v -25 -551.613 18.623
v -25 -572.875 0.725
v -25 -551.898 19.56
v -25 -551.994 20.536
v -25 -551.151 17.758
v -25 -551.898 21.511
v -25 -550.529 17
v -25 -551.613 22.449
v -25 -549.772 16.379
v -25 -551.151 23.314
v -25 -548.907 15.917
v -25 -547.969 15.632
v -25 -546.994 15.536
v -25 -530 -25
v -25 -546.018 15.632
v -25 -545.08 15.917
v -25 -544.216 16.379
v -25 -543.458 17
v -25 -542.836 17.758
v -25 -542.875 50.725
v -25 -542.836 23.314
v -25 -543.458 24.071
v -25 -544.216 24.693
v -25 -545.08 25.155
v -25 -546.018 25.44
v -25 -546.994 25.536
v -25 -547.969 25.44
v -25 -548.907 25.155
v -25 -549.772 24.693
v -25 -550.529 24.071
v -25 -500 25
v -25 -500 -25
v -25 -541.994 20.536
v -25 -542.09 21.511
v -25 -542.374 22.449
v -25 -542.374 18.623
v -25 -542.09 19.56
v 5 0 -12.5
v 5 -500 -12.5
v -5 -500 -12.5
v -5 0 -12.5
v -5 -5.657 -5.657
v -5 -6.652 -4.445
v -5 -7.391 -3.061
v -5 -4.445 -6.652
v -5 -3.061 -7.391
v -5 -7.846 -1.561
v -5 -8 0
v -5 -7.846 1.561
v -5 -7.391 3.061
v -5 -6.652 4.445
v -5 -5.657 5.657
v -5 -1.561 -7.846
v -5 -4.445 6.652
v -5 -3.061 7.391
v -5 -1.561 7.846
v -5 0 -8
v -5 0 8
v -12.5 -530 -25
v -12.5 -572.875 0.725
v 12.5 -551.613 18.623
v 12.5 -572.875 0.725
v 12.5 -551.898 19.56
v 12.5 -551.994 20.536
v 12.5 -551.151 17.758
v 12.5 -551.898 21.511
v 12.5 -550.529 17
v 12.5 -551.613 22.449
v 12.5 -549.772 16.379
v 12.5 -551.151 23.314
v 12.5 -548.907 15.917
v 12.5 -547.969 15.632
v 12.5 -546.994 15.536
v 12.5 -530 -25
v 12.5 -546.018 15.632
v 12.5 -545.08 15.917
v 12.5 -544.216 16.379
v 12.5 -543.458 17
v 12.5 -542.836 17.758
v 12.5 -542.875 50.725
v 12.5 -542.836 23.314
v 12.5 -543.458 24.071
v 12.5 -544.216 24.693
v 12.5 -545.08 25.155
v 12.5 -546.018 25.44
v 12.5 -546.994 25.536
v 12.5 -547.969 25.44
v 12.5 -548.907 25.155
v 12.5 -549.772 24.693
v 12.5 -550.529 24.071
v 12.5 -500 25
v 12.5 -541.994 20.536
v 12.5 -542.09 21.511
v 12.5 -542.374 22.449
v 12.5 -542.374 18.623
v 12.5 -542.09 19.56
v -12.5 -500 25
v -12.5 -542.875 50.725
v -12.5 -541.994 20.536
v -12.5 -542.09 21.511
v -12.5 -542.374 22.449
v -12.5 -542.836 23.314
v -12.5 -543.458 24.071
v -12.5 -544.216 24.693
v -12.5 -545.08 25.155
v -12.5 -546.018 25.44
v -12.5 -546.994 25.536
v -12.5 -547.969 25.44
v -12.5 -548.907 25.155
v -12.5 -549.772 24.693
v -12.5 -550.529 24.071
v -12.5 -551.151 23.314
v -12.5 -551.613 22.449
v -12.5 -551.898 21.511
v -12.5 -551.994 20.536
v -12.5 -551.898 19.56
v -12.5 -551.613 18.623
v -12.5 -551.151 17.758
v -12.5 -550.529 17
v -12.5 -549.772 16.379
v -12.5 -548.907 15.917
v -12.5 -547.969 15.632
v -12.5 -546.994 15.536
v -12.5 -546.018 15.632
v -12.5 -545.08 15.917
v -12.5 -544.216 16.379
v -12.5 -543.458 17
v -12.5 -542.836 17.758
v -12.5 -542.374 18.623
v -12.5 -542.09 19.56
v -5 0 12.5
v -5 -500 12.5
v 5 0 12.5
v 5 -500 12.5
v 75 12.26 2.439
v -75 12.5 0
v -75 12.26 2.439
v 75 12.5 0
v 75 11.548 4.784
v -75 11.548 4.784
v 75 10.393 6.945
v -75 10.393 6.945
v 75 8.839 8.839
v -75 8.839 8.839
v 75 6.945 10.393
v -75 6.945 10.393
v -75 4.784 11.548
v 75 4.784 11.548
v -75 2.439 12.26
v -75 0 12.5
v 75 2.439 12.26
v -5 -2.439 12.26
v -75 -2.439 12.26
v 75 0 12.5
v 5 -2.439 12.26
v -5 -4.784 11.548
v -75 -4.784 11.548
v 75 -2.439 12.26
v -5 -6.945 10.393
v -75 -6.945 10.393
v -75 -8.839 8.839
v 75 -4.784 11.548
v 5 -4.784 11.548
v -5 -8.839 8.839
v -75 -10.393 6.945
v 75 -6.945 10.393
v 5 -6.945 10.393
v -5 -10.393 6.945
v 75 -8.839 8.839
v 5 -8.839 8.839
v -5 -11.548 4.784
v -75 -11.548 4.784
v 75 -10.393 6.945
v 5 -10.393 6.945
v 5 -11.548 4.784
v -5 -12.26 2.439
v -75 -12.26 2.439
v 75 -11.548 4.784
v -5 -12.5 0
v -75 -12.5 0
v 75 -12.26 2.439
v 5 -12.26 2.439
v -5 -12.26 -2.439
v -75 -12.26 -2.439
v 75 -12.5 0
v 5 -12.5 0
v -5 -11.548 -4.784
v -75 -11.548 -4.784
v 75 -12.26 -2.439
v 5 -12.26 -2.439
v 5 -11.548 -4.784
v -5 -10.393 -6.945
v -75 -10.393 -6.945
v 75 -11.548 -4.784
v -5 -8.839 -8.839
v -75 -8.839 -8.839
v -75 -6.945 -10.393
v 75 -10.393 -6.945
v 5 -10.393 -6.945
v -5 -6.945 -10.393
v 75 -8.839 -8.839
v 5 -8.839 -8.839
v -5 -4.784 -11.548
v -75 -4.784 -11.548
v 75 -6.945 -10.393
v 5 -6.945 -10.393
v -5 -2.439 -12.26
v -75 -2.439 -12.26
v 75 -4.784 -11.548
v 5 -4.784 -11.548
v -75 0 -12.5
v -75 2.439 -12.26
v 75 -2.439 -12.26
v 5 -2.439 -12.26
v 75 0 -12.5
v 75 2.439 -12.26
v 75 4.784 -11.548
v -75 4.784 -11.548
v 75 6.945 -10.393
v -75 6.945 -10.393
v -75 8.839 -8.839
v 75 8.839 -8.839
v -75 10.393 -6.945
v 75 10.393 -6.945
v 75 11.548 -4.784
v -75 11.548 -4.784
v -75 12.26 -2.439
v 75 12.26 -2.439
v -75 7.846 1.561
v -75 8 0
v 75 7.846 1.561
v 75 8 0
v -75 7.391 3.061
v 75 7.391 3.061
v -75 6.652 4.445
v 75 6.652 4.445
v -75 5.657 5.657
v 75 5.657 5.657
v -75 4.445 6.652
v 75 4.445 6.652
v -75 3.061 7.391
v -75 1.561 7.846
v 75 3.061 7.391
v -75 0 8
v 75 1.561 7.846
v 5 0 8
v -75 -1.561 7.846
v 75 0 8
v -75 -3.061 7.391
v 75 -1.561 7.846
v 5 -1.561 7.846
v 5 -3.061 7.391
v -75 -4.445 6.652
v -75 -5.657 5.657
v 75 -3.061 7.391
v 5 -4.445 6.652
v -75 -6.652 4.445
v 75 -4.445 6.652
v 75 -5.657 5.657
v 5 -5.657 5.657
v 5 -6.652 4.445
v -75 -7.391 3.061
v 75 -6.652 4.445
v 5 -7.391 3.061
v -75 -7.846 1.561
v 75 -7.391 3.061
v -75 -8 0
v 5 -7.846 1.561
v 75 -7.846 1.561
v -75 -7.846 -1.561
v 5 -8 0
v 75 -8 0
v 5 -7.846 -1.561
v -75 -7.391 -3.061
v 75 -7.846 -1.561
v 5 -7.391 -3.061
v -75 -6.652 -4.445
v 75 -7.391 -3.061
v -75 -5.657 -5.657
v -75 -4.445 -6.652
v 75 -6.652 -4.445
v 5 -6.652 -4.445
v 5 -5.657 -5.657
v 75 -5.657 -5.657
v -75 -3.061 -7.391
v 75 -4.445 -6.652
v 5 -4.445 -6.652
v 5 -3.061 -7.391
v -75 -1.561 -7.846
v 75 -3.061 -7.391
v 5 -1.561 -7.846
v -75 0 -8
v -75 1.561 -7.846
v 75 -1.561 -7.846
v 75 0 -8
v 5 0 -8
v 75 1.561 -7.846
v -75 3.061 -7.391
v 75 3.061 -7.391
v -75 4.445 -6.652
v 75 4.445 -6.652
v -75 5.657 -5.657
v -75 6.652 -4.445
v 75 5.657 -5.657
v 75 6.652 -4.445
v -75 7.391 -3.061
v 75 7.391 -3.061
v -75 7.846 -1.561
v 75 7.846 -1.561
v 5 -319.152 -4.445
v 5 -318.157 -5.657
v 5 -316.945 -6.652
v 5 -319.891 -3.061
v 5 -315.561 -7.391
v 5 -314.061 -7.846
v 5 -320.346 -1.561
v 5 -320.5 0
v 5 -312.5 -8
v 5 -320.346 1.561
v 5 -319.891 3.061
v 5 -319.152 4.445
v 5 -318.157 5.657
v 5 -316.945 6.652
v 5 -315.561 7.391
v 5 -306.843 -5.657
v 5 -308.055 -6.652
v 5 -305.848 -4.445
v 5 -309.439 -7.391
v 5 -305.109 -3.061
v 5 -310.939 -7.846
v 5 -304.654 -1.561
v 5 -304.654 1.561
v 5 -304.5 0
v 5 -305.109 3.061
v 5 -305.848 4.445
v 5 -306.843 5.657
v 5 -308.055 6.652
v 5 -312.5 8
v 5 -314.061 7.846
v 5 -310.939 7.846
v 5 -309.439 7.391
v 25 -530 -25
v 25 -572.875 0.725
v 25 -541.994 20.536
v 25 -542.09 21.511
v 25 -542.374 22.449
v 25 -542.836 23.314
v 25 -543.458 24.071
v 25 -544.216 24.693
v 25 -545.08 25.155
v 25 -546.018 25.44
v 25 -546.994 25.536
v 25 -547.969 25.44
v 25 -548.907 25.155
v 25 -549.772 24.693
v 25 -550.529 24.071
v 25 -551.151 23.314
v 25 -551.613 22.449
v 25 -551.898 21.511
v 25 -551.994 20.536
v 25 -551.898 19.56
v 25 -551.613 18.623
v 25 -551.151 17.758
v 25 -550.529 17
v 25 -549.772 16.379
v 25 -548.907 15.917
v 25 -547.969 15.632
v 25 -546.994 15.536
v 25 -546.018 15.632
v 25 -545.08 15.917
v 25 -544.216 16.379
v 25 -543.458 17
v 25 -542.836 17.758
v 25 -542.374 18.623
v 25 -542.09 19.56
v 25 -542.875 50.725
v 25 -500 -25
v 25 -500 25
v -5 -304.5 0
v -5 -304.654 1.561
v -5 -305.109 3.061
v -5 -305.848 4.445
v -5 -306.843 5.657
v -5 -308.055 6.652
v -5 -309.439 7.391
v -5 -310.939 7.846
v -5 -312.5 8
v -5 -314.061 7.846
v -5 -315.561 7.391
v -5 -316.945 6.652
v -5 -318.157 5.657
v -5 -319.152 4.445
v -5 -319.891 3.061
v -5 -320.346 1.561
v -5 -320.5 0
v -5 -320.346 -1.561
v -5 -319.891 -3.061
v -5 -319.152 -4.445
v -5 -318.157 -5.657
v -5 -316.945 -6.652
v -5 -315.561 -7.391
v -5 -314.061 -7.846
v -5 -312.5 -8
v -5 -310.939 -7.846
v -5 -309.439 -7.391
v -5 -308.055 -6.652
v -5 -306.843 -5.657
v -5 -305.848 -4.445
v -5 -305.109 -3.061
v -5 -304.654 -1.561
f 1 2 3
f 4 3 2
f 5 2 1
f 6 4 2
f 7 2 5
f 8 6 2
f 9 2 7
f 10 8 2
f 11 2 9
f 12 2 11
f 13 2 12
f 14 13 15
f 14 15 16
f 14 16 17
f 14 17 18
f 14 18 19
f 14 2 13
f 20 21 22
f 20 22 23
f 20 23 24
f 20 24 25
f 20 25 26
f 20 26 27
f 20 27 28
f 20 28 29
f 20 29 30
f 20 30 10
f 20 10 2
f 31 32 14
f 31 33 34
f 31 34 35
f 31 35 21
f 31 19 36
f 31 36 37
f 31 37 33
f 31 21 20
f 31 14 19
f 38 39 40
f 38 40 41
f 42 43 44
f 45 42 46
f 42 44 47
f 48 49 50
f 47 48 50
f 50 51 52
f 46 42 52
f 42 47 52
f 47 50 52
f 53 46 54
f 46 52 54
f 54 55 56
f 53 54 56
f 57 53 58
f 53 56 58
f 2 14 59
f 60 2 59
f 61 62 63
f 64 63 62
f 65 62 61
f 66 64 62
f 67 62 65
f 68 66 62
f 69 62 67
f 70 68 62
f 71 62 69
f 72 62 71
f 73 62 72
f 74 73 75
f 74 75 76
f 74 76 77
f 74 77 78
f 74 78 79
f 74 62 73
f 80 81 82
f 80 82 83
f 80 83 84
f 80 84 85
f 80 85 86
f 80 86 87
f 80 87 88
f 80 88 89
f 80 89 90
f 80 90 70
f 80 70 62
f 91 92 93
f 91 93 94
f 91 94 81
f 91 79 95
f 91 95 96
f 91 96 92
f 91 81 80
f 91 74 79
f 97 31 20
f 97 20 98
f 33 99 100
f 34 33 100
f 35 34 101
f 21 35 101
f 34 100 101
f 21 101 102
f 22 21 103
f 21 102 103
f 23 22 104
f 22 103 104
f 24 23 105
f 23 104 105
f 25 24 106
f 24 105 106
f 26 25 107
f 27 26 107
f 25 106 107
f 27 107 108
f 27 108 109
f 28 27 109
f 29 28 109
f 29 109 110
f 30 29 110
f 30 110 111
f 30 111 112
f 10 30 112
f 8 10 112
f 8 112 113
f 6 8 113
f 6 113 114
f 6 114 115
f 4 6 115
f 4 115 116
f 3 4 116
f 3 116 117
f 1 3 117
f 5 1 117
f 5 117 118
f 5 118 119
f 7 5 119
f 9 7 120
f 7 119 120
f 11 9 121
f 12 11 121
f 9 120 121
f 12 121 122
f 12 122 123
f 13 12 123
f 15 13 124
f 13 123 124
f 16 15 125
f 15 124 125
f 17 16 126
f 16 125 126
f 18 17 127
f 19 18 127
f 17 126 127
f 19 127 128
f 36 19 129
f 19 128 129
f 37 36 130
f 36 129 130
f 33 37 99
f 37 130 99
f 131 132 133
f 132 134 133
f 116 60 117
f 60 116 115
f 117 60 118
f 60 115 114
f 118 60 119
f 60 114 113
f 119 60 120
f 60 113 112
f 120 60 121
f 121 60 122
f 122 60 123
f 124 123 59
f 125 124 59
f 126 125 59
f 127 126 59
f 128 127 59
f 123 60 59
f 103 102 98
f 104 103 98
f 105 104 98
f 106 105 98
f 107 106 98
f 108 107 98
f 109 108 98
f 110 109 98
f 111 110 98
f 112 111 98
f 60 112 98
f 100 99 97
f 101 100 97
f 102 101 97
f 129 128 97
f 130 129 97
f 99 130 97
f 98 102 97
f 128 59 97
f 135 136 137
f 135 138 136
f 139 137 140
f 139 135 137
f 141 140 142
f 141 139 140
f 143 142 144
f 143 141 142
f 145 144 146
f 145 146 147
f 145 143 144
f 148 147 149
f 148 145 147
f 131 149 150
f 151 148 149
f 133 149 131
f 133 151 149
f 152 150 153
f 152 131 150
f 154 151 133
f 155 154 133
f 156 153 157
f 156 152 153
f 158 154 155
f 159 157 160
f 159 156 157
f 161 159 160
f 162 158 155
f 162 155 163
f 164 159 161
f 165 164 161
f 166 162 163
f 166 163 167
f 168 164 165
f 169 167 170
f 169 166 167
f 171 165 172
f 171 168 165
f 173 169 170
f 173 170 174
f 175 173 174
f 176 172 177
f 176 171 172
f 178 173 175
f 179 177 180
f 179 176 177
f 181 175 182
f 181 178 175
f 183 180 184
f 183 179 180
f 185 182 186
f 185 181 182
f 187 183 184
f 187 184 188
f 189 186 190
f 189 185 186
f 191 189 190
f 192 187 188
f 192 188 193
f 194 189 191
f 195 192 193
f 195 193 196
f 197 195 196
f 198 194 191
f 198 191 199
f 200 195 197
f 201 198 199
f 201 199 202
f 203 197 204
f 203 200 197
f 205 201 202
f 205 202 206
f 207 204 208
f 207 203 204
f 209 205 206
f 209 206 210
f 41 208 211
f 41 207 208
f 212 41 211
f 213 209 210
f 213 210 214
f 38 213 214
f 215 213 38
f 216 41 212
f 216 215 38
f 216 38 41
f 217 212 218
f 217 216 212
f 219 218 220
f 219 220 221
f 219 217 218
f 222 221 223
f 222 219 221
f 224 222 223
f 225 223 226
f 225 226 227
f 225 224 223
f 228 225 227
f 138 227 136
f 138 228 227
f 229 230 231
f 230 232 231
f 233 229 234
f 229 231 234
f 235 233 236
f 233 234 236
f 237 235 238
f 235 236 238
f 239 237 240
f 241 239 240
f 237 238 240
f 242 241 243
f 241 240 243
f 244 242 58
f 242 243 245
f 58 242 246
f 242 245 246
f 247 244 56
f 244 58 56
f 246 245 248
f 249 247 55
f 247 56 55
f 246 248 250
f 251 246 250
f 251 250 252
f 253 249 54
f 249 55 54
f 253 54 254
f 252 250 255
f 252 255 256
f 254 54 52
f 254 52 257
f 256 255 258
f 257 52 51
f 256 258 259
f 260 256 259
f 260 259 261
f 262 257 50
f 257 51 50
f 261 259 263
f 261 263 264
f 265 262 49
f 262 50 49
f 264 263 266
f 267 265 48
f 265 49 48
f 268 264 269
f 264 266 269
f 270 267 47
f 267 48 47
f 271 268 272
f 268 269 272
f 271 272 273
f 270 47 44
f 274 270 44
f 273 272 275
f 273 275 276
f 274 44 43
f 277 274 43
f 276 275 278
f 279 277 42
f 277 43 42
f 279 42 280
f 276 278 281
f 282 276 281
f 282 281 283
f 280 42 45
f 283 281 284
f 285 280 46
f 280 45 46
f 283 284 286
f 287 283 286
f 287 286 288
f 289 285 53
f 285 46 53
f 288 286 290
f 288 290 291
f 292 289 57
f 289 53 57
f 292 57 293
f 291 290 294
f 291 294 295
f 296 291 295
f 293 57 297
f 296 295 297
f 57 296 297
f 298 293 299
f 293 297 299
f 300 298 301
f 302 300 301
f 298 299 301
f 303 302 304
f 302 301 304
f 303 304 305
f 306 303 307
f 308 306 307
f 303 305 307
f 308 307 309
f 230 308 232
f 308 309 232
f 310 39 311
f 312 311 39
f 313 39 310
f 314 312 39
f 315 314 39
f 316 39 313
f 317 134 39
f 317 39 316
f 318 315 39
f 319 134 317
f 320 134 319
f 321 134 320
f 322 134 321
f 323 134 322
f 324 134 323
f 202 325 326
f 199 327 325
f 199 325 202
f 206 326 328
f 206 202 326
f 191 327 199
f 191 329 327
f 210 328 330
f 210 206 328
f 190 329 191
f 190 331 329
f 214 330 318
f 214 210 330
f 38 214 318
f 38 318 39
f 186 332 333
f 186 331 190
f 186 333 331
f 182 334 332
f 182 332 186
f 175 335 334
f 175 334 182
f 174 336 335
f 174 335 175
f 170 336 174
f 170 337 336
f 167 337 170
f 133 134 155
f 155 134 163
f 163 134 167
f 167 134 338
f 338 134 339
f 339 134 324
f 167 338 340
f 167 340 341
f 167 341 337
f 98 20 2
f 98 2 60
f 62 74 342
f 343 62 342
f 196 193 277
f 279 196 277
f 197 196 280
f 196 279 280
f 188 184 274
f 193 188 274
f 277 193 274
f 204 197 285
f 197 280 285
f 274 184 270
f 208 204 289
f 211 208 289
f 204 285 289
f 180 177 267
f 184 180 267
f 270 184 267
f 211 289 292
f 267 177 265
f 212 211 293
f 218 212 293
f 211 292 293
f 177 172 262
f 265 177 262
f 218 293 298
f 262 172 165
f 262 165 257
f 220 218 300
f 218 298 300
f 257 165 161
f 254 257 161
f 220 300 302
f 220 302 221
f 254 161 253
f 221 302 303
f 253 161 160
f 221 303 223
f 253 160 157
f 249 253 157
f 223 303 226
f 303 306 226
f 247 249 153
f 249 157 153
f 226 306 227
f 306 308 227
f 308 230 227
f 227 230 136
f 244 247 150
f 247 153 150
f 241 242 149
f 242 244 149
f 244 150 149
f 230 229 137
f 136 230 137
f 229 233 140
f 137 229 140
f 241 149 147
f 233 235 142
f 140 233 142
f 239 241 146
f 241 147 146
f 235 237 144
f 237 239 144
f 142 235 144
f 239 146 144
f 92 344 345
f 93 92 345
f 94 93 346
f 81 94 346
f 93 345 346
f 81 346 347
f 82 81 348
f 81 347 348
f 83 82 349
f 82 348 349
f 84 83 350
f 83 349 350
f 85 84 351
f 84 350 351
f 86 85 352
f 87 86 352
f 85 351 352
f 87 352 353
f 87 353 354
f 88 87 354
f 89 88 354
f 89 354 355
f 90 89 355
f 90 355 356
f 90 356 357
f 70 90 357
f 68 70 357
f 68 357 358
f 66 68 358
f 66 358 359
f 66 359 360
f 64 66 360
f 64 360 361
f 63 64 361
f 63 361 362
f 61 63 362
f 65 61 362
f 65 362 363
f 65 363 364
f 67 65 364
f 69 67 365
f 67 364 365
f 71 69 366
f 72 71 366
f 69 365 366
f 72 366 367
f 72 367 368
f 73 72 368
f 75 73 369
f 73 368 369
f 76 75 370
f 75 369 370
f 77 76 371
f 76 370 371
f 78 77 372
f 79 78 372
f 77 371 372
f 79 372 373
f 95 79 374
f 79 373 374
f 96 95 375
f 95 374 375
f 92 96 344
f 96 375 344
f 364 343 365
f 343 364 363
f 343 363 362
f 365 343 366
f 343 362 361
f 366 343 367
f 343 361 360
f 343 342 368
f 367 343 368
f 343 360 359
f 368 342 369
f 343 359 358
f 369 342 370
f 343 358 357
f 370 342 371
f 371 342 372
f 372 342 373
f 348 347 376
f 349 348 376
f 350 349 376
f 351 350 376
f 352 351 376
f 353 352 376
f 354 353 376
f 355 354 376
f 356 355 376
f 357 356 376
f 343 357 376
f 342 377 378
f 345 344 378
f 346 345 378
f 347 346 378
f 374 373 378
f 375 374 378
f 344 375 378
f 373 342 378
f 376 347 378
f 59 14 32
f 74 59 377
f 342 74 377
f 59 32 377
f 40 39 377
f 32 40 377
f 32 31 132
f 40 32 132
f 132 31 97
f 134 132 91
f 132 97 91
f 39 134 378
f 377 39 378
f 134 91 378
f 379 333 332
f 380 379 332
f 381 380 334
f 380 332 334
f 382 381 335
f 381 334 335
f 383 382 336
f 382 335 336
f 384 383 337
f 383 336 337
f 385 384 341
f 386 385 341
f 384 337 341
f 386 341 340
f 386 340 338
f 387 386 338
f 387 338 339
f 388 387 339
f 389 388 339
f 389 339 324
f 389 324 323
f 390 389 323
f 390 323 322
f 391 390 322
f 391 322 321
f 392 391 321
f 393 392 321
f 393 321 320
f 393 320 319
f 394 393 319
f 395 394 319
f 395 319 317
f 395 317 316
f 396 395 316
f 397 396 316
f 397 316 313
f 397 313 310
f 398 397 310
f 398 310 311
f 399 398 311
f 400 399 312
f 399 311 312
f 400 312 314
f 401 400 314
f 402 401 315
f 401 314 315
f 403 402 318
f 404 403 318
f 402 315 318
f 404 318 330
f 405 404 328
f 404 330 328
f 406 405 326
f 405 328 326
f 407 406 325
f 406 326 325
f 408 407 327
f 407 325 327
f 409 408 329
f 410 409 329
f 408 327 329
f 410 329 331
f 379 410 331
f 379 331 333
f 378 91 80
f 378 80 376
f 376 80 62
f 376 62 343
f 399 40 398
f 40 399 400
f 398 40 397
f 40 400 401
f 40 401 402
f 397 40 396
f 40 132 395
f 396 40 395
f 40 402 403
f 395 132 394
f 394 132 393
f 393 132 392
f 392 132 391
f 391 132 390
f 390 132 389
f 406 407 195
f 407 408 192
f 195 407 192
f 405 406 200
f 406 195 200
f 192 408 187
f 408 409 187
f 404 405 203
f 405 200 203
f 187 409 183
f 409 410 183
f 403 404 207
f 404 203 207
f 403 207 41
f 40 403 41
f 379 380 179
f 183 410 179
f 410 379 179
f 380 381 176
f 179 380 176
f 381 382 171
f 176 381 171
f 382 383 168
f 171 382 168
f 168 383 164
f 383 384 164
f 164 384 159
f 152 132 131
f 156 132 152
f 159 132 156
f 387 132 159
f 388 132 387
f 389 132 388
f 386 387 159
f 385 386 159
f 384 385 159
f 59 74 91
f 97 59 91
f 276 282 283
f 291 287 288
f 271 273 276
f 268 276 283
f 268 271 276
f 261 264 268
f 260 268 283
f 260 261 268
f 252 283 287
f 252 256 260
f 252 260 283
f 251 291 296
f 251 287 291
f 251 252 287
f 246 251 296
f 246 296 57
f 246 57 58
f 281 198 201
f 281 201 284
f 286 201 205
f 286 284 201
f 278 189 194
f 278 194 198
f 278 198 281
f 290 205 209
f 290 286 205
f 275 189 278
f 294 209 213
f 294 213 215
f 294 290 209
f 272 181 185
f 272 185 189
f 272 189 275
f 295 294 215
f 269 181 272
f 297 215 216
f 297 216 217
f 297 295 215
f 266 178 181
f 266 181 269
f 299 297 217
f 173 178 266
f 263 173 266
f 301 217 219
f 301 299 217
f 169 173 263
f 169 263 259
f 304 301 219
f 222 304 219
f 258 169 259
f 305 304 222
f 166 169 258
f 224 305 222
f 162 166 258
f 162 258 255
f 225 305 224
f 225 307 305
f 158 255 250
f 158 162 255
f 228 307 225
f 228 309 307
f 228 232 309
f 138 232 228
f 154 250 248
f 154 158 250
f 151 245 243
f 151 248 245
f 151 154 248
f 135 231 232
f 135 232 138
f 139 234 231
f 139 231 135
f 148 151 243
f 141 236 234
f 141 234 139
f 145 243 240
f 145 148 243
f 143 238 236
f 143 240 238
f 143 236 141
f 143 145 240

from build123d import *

# Parameters (mm, degrees)
F0_R          = 12.5
F0_R_2        = 8
F1_DEPTH      = 75
F1_DEPTH_BACK = 75
F2_W          = 500
F2_H          = 25
F3_DEPTH      = 5
F3_DEPTH_BACK = 5
F4_R          = 8
F5_DEPTH      = 25
F5_DEPTH_BACK = 25
F6_W          = 50
F6_H          = 50
F6_W_2        = 10
F6_H_2        = 25
F7_DEPTH      = 30
F9_DEPTH      = 50
F10_W         = 12.5
F10_H         = 58.3095189485
F11_DEPTH     = 50
F12_R         = 5
F13_DEPTH     = 100.001


with BuildPart() as f1:
    # F0 (on Right) → F1 (new body, two sides)
    with BuildSketch(Plane.YZ) as f1_sk:
        Circle(F0_R)
        Circle(F0_R_2, mode=Mode.SUBTRACT)
    extrude(amount=F1_DEPTH)
    extrude(f1_sk.sketch, amount=-F1_DEPTH_BACK)

    # F2 (on Right) → F3 (join, two sides)
    with BuildSketch(Plane.YZ) as f3_sk:
        with Locations((-250, 0)):
            Rectangle(F2_W, F2_H)
    extrude(amount=F3_DEPTH)
    extrude(f3_sk.sketch, amount=-F3_DEPTH_BACK)

    # F4 (on face) → F5 (cut, two sides)
    with BuildSketch(Plane.YZ.offset(5)) as f5_sk:
        with Locations((-312.5, 0)):
            Circle(F4_R)
    extrude(amount=F5_DEPTH, mode=Mode.SUBTRACT)
    extrude(f5_sk.sketch, amount=-F5_DEPTH_BACK, mode=Mode.SUBTRACT)

    # F6 (on face) → F7 (join)
    with BuildSketch(Plane.XZ.offset(500)):
        Rectangle(F6_W, F6_H)
        Rectangle(F6_W_2, F6_H_2, mode=Mode.SUBTRACT)
        Rectangle(F6_W_2, F6_H_2)
    extrude(amount=F7_DEPTH)

    # F8 (on face) → F9 (cut)
    with BuildSketch(Plane.YZ.offset(25)):
        Polygon((-530, 25), (-530, -25), (-500, 25), align=None)
    extrude(amount=-F9_DEPTH, mode=Mode.SUBTRACT)

    # F10 (on face) → F11 (join)
    with BuildSketch(Plane(origin=(0, -378.6764705882, 227.2058823529), x_dir=(1, 0, 0), z_dir=(0, -0.8574929257, 0.5144957554))):
        with Locations((-18.75, -264.9653140452)):
            Rectangle(F10_W, F10_H)
        with Locations((18.75, -264.9653140452)):
            Rectangle(F10_W, F10_H)
    extrude(amount=F11_DEPTH)

    # F12 (on face) → F13 (cut, through all)
    with BuildSketch(Plane.YZ.offset(25)):
        with Locations((-546.9936727221, 20.5359361312)):
            Circle(F12_R)
    extrude(amount=-F13_DEPTH, mode=Mode.SUBTRACT)


solid = f1.part
